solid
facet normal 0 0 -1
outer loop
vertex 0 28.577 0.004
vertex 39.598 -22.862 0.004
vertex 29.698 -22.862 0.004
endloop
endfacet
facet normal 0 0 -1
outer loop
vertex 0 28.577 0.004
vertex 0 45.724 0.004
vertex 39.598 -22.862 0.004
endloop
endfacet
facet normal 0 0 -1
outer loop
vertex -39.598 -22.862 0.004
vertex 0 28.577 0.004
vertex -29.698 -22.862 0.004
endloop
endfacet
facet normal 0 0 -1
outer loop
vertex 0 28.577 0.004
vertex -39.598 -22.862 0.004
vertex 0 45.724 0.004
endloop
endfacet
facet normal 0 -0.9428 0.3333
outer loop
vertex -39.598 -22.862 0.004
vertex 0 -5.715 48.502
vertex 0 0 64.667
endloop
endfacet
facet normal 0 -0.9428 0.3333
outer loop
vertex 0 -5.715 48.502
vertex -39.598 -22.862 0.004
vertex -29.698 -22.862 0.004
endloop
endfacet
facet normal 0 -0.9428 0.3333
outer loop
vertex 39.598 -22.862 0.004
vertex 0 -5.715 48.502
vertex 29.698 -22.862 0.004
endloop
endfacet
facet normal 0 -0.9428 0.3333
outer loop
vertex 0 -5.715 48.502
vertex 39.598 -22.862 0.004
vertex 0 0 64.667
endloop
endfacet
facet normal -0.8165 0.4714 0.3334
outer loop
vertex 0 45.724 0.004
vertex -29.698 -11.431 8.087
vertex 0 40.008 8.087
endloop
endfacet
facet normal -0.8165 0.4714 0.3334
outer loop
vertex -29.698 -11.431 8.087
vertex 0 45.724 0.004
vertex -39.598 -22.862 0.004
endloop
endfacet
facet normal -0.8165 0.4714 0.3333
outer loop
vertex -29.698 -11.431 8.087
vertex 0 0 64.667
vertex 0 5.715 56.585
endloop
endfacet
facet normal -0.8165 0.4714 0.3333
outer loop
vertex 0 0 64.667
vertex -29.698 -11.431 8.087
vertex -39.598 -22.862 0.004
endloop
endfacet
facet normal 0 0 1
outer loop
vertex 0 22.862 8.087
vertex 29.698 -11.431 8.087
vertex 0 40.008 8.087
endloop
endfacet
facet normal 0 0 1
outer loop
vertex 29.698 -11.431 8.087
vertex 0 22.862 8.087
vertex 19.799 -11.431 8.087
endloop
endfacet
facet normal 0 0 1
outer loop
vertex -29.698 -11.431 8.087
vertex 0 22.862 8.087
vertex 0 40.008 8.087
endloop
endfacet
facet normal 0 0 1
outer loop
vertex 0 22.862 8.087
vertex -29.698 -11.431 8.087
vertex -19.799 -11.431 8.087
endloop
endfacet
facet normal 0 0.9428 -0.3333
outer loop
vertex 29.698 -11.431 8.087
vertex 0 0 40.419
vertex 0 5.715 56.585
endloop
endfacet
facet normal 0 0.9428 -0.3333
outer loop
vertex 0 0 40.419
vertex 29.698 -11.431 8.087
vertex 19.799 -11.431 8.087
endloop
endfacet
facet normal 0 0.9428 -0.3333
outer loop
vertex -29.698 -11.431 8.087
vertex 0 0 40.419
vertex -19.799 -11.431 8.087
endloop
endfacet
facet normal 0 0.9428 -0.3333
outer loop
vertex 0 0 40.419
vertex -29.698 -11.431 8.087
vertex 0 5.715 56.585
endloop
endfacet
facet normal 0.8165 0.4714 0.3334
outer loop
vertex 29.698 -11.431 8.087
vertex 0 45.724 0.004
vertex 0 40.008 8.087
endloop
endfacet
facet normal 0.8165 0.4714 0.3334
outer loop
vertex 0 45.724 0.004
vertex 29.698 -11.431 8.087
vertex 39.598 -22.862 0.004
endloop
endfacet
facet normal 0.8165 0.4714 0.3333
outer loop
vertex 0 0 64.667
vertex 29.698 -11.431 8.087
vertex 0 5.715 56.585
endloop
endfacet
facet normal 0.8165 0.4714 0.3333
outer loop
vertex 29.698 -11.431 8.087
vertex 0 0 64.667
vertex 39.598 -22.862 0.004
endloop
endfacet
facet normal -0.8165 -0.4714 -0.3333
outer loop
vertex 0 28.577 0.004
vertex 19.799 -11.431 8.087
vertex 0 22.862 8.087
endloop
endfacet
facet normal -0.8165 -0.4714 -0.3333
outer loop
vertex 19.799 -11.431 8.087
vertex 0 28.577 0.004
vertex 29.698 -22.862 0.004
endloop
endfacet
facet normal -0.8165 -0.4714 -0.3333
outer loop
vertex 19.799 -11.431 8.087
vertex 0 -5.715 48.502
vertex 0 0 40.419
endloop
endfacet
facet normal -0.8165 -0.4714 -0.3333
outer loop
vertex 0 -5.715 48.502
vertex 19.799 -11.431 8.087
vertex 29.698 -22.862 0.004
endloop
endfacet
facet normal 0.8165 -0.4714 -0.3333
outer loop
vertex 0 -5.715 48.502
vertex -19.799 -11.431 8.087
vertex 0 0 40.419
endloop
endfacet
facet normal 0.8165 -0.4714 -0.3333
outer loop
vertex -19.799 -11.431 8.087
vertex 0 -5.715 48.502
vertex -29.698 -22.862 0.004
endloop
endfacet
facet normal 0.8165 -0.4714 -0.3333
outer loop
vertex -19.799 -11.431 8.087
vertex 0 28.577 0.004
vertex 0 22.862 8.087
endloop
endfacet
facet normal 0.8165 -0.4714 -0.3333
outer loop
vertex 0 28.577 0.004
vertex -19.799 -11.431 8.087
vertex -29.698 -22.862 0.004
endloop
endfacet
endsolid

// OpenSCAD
/*
A toroidal polyhedra from McCooey's "Visual Polyhedra" site - http://dmccooey.com/polyhedra/ 

This example is called a Hexagonal Toroid with 8 overarching faces 


----------------
http://dmccooey.com/polyhedra/OverarchingHexagonalToroid8.html

Vertices:
16  (4[3] + 4[3] + 4[3] + 4[3])
Faces:
8  ({4 * 2} mirror-symmetric nonconvex hexagons)
Edges:
24  (4 different lengths)
Symmetry:
2-fold Antiprismatic  (D2v)

References:
[1]
J. Schw�rbel, Die kombinatorisch regul�ren Tori.
Thesis, Siegen University, 1988.

[2]
Lajos Szilassi, personal communication
-----------------


PCM April 2018
*/
  translate([0,0,16.17])
   scale(7)
  rotate([acos(1/sqrt(3)),180,0])
  rotate([0,0,45])
  polyhedron (hex_8_cords,Faces);


//Hexagonal Toroid with 8 overarching faces



 hex_8_cords = [
      [ 4, -4,  4],
      [ 4,  4, -4],
      [-4,  4,  4],
      [-4, -4, -4],
      [ 3, -3,  4],
      [ 3,  3, -4],
      [-3,  3,  4],
      [-3, -3, -4],
      [ 3, -3,  2],
      [ 3,  3, -2],
      [-3,  3,  2],
      [-3, -3, -2],
      [ 2, -2,  2],
      [ 2,  2, -2],
      [-2,  2,  2],
      [-2, -2, -2],
   ];


Faces = [
     [  4,  9,  6,  2,  1,  0],
     [  3,  2,  6, 11,  4,  0],
     [  1,  5,  8,  7,  3,  0],
     [ 14, 13, 12,  8,  5, 10],
     [  7,  8, 12, 15, 14, 10],
     [  5,  1,  2,  3,  7, 10],
     [ 13, 14, 15, 11,  6,  9],
     [  4, 11, 15, 12, 13,  9],
    ];
